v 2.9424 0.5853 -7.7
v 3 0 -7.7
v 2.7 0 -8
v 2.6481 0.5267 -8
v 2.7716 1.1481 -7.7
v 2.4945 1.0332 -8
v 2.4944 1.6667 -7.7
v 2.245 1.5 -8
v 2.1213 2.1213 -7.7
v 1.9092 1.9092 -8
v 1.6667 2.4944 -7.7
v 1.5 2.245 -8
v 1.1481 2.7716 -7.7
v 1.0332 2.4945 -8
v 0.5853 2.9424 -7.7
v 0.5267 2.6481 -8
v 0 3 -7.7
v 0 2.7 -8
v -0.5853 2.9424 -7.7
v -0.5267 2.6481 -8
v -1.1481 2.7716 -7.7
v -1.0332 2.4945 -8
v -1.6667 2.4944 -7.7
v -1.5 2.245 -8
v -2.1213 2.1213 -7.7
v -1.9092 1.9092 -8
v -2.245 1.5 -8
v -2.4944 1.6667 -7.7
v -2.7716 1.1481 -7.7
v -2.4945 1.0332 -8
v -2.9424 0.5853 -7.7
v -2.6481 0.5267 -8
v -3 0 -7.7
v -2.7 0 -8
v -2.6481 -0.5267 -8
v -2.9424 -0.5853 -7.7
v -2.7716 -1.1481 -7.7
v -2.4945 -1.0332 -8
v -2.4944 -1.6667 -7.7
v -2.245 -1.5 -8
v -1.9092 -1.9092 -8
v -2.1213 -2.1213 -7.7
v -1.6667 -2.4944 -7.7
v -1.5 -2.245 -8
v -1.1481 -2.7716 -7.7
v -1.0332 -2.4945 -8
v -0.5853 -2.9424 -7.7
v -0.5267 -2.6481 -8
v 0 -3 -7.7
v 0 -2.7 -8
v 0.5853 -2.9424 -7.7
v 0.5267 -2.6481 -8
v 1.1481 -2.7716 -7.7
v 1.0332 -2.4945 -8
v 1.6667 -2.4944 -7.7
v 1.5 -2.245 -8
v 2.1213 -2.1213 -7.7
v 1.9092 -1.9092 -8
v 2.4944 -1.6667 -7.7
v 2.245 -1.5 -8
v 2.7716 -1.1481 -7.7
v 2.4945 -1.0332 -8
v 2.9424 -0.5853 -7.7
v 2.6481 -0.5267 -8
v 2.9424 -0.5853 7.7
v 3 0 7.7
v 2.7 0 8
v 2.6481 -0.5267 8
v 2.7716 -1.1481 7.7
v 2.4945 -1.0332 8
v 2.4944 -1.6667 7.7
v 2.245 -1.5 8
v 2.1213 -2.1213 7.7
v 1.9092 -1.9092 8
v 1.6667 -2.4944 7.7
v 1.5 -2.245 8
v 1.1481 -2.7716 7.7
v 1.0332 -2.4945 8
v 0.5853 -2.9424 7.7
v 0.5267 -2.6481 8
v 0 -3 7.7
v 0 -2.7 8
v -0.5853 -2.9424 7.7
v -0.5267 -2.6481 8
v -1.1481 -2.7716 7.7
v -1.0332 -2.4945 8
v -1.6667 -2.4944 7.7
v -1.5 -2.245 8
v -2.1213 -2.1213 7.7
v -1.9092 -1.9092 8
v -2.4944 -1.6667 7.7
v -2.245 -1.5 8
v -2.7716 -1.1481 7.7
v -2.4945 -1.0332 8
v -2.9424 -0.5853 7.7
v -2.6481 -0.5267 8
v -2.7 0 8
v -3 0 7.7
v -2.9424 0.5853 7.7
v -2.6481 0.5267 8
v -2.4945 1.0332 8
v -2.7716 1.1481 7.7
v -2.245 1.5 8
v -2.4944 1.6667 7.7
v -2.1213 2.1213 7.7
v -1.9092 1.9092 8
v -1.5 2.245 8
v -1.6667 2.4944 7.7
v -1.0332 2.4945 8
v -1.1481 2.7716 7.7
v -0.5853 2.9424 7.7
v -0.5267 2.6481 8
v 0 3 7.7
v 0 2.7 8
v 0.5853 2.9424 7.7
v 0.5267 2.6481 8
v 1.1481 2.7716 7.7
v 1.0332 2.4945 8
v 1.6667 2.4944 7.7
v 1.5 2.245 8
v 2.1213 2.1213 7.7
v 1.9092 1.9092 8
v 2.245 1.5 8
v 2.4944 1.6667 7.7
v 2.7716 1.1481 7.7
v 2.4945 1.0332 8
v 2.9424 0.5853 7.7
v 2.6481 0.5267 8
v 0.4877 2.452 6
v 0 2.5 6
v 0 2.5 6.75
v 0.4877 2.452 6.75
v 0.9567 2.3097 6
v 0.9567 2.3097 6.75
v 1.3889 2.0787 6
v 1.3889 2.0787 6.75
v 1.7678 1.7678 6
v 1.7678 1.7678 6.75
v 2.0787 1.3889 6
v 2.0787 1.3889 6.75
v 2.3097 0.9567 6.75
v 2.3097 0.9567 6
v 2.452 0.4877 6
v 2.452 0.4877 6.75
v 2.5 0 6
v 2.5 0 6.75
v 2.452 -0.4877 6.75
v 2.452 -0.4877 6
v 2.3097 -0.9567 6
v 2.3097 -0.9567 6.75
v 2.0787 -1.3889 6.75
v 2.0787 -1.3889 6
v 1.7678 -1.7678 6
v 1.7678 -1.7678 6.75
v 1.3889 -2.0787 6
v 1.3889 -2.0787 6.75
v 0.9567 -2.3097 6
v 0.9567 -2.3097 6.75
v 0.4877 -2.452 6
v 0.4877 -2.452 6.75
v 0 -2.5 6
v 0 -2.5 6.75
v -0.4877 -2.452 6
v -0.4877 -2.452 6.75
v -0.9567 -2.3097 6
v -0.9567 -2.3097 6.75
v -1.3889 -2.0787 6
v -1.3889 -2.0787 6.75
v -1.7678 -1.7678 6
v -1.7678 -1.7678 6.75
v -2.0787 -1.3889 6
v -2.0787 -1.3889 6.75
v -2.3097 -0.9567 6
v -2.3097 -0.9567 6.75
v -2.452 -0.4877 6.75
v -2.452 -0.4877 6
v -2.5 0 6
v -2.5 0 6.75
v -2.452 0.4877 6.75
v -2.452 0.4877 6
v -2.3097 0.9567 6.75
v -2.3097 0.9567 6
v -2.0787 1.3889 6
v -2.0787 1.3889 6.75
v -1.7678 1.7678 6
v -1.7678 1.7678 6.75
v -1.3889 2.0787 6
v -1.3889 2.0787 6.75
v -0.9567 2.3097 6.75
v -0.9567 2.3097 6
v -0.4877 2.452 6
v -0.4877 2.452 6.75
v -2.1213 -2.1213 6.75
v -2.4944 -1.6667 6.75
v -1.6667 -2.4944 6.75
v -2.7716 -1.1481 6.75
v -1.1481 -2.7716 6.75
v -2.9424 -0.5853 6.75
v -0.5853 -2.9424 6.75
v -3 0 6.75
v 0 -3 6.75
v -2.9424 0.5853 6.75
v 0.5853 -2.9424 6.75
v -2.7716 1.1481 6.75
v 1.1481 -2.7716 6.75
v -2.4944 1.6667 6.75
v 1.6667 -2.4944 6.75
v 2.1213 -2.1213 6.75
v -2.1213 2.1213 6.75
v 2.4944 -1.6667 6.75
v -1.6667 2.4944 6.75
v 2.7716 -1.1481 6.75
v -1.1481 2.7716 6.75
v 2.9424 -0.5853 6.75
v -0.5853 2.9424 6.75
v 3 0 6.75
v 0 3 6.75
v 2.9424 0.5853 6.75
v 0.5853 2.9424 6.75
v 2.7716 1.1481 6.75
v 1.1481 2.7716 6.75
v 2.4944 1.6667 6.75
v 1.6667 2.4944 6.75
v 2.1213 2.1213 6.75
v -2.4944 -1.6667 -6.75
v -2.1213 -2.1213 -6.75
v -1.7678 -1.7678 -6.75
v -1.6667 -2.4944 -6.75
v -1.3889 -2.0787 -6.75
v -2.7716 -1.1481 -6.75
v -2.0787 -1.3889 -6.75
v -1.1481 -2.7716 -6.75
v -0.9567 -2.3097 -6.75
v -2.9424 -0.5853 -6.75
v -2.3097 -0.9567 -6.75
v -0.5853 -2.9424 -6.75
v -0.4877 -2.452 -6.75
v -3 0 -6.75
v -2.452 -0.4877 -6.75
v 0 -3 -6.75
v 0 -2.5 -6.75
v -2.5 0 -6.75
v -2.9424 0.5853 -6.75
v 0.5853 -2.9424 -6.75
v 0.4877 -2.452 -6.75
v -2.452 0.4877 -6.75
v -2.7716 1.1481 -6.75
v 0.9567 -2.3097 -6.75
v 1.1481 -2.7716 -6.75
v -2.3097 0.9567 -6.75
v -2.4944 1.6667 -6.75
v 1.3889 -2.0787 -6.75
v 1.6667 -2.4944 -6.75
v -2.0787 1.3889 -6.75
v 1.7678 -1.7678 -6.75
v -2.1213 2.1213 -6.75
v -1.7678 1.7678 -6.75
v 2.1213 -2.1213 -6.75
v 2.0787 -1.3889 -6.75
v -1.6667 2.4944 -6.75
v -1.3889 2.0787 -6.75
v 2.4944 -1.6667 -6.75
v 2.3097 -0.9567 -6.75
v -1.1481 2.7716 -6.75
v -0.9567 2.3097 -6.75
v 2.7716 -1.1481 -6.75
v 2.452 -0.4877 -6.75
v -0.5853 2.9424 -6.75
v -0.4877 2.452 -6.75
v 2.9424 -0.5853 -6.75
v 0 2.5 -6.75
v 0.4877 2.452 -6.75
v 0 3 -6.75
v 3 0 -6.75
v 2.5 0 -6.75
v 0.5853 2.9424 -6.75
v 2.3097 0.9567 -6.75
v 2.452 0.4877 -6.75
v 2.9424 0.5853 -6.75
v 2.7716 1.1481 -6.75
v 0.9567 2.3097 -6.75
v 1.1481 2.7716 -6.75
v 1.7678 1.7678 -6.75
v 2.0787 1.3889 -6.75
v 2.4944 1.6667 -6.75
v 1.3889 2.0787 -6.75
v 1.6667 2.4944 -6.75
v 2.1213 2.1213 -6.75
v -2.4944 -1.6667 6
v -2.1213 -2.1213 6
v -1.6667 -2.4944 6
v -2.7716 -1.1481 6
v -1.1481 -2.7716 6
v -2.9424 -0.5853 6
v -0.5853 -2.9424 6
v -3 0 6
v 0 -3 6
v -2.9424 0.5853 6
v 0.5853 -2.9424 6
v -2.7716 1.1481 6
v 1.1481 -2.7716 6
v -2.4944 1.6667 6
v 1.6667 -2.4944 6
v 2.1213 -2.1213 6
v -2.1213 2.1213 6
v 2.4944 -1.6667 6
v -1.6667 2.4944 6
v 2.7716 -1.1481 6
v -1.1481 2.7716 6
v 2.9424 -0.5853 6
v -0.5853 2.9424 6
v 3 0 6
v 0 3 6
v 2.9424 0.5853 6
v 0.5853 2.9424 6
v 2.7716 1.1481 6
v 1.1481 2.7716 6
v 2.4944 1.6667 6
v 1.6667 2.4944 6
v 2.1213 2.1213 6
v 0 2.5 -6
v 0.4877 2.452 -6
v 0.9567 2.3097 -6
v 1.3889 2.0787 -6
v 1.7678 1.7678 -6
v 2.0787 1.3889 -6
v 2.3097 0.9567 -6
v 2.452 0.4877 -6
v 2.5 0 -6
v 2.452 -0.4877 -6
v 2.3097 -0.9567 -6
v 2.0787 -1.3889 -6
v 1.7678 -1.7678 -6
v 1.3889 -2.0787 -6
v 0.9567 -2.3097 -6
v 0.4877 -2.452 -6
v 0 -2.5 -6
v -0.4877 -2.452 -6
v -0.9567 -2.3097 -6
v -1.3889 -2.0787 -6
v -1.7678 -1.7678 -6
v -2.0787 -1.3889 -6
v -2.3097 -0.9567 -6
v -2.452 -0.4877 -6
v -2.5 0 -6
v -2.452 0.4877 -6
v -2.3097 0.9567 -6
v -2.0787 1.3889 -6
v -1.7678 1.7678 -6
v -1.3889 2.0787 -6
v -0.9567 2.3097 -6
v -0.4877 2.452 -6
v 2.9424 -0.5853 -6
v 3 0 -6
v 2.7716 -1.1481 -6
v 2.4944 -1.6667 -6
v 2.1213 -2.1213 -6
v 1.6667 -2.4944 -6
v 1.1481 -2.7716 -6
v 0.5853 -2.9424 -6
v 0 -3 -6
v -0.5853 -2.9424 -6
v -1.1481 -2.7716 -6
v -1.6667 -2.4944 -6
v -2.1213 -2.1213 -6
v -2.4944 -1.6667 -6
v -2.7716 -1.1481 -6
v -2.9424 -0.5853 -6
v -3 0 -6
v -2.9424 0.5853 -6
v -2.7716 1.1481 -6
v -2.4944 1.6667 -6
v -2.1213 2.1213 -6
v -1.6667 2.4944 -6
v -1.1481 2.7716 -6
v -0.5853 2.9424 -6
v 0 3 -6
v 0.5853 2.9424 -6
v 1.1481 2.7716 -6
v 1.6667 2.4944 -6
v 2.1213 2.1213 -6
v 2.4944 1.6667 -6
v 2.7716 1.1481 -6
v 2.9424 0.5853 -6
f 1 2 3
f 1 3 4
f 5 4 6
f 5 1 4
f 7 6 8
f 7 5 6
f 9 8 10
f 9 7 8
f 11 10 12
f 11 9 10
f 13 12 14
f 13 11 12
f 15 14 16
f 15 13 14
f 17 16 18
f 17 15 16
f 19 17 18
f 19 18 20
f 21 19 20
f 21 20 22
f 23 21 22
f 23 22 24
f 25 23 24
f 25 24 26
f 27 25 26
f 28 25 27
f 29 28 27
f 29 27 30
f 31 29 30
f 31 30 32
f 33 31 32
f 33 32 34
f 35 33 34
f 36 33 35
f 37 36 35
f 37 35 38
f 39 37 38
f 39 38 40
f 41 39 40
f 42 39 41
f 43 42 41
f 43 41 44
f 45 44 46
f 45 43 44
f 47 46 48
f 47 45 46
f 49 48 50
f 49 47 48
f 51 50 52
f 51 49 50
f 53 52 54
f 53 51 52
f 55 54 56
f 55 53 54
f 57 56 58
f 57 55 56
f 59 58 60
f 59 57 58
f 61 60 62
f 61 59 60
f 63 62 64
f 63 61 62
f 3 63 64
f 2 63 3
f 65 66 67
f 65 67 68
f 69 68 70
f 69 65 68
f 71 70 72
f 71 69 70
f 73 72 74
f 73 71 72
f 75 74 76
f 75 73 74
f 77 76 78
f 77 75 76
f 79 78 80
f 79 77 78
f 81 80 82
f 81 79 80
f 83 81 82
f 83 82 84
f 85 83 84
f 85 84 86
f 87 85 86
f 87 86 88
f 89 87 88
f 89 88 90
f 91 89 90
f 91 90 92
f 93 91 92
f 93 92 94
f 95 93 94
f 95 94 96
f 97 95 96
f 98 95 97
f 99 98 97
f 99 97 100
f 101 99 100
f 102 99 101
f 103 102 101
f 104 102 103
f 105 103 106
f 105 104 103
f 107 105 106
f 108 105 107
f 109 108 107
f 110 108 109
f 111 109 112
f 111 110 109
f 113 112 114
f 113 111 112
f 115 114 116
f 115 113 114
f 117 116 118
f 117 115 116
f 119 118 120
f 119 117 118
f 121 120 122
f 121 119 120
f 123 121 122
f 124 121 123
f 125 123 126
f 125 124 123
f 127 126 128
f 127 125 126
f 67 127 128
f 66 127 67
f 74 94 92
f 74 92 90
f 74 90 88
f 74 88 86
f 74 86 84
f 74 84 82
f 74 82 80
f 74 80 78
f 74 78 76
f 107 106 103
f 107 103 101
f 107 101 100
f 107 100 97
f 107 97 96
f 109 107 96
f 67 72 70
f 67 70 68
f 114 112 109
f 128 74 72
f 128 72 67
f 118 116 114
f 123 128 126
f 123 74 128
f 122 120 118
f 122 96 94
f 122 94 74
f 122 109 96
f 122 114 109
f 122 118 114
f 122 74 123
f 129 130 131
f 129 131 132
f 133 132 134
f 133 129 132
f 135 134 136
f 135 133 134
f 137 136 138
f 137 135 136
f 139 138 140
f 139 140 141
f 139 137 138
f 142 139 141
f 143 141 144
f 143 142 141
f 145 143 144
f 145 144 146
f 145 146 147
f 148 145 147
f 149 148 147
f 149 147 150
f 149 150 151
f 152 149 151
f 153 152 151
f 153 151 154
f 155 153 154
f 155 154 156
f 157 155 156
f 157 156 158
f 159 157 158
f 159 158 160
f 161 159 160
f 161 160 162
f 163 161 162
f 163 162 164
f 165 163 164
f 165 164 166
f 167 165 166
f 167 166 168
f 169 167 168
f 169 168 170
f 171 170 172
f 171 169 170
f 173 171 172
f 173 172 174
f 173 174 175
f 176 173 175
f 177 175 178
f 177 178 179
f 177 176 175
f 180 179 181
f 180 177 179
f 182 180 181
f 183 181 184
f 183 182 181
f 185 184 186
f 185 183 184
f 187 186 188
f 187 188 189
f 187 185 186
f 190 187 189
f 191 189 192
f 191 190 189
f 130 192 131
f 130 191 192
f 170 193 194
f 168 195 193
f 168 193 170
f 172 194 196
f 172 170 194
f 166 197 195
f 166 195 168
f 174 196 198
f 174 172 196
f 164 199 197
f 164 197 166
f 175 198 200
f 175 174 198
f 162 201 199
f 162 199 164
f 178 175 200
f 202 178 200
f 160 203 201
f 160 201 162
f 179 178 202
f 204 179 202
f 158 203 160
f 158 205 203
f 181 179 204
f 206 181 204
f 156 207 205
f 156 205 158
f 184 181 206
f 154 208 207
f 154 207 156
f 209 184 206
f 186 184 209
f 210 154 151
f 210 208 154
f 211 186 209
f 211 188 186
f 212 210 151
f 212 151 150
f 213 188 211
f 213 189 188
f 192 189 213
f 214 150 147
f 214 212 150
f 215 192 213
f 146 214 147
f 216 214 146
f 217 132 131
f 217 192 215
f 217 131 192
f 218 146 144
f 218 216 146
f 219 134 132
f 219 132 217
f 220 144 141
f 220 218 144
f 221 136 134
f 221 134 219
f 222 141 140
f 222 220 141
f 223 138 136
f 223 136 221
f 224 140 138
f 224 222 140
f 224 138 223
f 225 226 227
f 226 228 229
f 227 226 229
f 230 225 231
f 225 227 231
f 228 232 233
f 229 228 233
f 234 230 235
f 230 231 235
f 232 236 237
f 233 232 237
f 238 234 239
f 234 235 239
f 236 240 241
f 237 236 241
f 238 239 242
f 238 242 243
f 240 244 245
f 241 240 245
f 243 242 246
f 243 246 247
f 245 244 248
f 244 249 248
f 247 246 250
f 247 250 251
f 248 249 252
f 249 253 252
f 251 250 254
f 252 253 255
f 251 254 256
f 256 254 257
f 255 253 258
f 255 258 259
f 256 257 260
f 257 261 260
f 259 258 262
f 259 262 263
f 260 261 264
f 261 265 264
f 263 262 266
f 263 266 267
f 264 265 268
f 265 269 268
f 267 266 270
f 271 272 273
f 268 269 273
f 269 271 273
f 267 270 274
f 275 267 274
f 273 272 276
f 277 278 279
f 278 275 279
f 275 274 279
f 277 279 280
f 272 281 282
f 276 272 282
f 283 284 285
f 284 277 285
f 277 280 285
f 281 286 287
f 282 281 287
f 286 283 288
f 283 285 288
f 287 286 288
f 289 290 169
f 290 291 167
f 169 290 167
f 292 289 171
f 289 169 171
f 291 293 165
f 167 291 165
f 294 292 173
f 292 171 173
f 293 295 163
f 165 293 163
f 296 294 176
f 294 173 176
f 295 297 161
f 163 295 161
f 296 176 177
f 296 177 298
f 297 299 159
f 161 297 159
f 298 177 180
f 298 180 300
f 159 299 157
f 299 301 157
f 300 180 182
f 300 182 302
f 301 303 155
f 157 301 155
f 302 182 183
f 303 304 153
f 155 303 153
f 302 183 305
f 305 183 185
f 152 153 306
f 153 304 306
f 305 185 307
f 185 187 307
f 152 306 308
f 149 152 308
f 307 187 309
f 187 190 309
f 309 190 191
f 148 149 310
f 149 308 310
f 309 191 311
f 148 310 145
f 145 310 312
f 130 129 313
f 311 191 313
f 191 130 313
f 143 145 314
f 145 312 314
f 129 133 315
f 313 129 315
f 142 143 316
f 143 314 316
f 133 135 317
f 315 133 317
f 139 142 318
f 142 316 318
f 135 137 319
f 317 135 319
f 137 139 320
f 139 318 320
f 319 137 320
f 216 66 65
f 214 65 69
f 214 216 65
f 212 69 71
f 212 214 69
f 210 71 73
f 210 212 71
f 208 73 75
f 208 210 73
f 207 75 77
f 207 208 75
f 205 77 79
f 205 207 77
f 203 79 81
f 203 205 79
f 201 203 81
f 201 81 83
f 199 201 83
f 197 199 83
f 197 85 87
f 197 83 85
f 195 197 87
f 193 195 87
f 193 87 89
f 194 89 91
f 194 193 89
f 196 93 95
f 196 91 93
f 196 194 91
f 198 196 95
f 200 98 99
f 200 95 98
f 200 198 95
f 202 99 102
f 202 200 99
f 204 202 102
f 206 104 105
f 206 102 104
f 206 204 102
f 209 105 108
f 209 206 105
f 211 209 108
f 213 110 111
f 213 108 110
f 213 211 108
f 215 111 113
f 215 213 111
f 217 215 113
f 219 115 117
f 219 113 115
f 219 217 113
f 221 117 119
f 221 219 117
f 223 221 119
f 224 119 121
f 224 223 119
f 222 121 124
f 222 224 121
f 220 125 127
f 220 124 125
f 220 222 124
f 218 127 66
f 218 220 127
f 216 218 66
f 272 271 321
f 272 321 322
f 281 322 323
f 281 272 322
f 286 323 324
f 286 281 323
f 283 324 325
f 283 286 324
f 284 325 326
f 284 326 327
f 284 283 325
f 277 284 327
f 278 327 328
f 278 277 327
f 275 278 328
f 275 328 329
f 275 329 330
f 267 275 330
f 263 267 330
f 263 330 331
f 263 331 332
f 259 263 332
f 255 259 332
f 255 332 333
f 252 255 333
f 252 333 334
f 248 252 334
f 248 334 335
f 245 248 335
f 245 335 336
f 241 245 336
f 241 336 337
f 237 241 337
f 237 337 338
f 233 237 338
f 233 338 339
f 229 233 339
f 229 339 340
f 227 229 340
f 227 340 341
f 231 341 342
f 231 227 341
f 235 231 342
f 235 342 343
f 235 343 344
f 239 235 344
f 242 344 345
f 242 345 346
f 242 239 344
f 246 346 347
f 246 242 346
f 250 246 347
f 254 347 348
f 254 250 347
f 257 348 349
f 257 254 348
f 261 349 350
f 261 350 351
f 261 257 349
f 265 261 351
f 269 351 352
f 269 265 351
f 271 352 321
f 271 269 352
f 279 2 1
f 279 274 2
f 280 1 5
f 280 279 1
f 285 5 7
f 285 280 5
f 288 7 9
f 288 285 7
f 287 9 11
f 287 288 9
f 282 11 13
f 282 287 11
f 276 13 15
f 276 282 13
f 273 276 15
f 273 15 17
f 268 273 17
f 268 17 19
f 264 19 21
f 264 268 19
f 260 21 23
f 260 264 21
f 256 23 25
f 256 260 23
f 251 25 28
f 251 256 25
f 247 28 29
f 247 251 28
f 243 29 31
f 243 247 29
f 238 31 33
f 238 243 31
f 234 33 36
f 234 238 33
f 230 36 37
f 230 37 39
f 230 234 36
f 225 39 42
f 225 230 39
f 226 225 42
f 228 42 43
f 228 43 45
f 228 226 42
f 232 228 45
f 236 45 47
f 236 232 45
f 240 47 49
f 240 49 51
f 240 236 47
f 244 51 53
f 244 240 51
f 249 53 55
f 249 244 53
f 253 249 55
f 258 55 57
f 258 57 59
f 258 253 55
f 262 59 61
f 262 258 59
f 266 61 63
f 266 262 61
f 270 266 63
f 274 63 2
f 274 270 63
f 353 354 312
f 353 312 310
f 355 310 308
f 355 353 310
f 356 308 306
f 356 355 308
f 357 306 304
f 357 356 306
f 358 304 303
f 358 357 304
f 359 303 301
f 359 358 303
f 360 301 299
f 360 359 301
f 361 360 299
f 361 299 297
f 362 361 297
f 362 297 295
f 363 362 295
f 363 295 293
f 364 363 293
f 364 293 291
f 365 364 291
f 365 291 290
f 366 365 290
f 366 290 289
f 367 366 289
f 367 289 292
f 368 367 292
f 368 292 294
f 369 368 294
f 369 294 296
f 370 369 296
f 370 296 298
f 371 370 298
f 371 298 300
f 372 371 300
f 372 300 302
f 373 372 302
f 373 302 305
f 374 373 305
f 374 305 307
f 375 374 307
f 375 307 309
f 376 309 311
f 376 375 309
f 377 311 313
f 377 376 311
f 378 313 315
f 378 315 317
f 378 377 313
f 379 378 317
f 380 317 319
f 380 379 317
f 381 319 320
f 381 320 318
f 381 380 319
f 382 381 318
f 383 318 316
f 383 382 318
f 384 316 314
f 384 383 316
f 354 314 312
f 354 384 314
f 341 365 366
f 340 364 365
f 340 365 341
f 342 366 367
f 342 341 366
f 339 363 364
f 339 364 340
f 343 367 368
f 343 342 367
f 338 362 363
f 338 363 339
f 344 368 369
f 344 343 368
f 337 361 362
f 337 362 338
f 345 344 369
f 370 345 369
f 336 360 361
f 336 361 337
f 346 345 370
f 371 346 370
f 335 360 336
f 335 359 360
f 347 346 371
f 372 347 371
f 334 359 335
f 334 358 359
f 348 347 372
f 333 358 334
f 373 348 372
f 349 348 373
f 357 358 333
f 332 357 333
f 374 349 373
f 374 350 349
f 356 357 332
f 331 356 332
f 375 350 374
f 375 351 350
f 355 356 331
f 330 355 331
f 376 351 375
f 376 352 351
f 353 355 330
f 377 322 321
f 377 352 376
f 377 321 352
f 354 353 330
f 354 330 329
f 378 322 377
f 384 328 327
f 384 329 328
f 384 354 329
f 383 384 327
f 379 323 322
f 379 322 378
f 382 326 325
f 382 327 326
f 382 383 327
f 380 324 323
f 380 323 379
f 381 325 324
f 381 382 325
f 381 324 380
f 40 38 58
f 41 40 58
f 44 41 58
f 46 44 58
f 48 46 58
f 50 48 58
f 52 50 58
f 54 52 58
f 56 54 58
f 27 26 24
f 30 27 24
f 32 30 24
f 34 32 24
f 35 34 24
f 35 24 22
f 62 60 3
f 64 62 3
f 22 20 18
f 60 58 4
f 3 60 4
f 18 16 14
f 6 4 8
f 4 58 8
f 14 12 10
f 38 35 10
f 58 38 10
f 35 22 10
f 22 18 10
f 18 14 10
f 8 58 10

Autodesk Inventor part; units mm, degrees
ref_plane "YZ Plane" through (0, 0, 0) normal (1, 0, 0) x (0, 1, 0)
ref_plane "XZ Plane" through (0, 0, 0) normal (0, 1, 0) x (-1, 0, 0)
ref_plane "XY Plane" through (0, 0, 0) normal (0, 0, 1) x (1, 0, 0)
sketch "Esboço1" plane through (0, 0, 0) normal (0, 0, 1) x (1, 0, 0)
  circle A0 centre (0, 0) radius 3
  dimension "d0" = 6
extrude "Extrusão1" add sketch "Esboço1" along normal mid plane 16
sketch "Esboço2" plane through (0, 0, 0) normal (1, 0, 0) x (0, 1, 0)
  line L0 (3.25, -6) -> (2.5, -6)
  line L1 (2.5, -6) -> (2.5, -6.75)
  line L2 (2.5, -6.75) -> (3.25, -6.75)
  line L3 (3.25, -6.75) -> (3.25, -6)
  line L4 (3.1313, 6.75) -> (2.5, 6.75)
  line L5 (2.5, 6.75) -> (2.5, 6)
  line L6 (2.5, 6) -> (3.1313, 6)
  line L7 (3.1313, 6) -> (3.1313, 6.75)
  line L8 (0, 0) -> (0, -8)
  line L9 (-3, -8) -> (3, -8) projected
  dimension "d3" = 5
  dimension "d4" = 6.5
  dimension "d5" = 6
  dimension "d6" = 0.75
  dimension "d7" = 6
  dimension "d8" = 0.75
revolve "Revolução1" cut sketch "Esboço2" angle 360 about axis through (0, 0, 0) along (0, 0, -1)
chamfer "Chanfro1" distance 0.3 angle 45 2 edges at (-3, 0, 8) (-3, 0, -8)
